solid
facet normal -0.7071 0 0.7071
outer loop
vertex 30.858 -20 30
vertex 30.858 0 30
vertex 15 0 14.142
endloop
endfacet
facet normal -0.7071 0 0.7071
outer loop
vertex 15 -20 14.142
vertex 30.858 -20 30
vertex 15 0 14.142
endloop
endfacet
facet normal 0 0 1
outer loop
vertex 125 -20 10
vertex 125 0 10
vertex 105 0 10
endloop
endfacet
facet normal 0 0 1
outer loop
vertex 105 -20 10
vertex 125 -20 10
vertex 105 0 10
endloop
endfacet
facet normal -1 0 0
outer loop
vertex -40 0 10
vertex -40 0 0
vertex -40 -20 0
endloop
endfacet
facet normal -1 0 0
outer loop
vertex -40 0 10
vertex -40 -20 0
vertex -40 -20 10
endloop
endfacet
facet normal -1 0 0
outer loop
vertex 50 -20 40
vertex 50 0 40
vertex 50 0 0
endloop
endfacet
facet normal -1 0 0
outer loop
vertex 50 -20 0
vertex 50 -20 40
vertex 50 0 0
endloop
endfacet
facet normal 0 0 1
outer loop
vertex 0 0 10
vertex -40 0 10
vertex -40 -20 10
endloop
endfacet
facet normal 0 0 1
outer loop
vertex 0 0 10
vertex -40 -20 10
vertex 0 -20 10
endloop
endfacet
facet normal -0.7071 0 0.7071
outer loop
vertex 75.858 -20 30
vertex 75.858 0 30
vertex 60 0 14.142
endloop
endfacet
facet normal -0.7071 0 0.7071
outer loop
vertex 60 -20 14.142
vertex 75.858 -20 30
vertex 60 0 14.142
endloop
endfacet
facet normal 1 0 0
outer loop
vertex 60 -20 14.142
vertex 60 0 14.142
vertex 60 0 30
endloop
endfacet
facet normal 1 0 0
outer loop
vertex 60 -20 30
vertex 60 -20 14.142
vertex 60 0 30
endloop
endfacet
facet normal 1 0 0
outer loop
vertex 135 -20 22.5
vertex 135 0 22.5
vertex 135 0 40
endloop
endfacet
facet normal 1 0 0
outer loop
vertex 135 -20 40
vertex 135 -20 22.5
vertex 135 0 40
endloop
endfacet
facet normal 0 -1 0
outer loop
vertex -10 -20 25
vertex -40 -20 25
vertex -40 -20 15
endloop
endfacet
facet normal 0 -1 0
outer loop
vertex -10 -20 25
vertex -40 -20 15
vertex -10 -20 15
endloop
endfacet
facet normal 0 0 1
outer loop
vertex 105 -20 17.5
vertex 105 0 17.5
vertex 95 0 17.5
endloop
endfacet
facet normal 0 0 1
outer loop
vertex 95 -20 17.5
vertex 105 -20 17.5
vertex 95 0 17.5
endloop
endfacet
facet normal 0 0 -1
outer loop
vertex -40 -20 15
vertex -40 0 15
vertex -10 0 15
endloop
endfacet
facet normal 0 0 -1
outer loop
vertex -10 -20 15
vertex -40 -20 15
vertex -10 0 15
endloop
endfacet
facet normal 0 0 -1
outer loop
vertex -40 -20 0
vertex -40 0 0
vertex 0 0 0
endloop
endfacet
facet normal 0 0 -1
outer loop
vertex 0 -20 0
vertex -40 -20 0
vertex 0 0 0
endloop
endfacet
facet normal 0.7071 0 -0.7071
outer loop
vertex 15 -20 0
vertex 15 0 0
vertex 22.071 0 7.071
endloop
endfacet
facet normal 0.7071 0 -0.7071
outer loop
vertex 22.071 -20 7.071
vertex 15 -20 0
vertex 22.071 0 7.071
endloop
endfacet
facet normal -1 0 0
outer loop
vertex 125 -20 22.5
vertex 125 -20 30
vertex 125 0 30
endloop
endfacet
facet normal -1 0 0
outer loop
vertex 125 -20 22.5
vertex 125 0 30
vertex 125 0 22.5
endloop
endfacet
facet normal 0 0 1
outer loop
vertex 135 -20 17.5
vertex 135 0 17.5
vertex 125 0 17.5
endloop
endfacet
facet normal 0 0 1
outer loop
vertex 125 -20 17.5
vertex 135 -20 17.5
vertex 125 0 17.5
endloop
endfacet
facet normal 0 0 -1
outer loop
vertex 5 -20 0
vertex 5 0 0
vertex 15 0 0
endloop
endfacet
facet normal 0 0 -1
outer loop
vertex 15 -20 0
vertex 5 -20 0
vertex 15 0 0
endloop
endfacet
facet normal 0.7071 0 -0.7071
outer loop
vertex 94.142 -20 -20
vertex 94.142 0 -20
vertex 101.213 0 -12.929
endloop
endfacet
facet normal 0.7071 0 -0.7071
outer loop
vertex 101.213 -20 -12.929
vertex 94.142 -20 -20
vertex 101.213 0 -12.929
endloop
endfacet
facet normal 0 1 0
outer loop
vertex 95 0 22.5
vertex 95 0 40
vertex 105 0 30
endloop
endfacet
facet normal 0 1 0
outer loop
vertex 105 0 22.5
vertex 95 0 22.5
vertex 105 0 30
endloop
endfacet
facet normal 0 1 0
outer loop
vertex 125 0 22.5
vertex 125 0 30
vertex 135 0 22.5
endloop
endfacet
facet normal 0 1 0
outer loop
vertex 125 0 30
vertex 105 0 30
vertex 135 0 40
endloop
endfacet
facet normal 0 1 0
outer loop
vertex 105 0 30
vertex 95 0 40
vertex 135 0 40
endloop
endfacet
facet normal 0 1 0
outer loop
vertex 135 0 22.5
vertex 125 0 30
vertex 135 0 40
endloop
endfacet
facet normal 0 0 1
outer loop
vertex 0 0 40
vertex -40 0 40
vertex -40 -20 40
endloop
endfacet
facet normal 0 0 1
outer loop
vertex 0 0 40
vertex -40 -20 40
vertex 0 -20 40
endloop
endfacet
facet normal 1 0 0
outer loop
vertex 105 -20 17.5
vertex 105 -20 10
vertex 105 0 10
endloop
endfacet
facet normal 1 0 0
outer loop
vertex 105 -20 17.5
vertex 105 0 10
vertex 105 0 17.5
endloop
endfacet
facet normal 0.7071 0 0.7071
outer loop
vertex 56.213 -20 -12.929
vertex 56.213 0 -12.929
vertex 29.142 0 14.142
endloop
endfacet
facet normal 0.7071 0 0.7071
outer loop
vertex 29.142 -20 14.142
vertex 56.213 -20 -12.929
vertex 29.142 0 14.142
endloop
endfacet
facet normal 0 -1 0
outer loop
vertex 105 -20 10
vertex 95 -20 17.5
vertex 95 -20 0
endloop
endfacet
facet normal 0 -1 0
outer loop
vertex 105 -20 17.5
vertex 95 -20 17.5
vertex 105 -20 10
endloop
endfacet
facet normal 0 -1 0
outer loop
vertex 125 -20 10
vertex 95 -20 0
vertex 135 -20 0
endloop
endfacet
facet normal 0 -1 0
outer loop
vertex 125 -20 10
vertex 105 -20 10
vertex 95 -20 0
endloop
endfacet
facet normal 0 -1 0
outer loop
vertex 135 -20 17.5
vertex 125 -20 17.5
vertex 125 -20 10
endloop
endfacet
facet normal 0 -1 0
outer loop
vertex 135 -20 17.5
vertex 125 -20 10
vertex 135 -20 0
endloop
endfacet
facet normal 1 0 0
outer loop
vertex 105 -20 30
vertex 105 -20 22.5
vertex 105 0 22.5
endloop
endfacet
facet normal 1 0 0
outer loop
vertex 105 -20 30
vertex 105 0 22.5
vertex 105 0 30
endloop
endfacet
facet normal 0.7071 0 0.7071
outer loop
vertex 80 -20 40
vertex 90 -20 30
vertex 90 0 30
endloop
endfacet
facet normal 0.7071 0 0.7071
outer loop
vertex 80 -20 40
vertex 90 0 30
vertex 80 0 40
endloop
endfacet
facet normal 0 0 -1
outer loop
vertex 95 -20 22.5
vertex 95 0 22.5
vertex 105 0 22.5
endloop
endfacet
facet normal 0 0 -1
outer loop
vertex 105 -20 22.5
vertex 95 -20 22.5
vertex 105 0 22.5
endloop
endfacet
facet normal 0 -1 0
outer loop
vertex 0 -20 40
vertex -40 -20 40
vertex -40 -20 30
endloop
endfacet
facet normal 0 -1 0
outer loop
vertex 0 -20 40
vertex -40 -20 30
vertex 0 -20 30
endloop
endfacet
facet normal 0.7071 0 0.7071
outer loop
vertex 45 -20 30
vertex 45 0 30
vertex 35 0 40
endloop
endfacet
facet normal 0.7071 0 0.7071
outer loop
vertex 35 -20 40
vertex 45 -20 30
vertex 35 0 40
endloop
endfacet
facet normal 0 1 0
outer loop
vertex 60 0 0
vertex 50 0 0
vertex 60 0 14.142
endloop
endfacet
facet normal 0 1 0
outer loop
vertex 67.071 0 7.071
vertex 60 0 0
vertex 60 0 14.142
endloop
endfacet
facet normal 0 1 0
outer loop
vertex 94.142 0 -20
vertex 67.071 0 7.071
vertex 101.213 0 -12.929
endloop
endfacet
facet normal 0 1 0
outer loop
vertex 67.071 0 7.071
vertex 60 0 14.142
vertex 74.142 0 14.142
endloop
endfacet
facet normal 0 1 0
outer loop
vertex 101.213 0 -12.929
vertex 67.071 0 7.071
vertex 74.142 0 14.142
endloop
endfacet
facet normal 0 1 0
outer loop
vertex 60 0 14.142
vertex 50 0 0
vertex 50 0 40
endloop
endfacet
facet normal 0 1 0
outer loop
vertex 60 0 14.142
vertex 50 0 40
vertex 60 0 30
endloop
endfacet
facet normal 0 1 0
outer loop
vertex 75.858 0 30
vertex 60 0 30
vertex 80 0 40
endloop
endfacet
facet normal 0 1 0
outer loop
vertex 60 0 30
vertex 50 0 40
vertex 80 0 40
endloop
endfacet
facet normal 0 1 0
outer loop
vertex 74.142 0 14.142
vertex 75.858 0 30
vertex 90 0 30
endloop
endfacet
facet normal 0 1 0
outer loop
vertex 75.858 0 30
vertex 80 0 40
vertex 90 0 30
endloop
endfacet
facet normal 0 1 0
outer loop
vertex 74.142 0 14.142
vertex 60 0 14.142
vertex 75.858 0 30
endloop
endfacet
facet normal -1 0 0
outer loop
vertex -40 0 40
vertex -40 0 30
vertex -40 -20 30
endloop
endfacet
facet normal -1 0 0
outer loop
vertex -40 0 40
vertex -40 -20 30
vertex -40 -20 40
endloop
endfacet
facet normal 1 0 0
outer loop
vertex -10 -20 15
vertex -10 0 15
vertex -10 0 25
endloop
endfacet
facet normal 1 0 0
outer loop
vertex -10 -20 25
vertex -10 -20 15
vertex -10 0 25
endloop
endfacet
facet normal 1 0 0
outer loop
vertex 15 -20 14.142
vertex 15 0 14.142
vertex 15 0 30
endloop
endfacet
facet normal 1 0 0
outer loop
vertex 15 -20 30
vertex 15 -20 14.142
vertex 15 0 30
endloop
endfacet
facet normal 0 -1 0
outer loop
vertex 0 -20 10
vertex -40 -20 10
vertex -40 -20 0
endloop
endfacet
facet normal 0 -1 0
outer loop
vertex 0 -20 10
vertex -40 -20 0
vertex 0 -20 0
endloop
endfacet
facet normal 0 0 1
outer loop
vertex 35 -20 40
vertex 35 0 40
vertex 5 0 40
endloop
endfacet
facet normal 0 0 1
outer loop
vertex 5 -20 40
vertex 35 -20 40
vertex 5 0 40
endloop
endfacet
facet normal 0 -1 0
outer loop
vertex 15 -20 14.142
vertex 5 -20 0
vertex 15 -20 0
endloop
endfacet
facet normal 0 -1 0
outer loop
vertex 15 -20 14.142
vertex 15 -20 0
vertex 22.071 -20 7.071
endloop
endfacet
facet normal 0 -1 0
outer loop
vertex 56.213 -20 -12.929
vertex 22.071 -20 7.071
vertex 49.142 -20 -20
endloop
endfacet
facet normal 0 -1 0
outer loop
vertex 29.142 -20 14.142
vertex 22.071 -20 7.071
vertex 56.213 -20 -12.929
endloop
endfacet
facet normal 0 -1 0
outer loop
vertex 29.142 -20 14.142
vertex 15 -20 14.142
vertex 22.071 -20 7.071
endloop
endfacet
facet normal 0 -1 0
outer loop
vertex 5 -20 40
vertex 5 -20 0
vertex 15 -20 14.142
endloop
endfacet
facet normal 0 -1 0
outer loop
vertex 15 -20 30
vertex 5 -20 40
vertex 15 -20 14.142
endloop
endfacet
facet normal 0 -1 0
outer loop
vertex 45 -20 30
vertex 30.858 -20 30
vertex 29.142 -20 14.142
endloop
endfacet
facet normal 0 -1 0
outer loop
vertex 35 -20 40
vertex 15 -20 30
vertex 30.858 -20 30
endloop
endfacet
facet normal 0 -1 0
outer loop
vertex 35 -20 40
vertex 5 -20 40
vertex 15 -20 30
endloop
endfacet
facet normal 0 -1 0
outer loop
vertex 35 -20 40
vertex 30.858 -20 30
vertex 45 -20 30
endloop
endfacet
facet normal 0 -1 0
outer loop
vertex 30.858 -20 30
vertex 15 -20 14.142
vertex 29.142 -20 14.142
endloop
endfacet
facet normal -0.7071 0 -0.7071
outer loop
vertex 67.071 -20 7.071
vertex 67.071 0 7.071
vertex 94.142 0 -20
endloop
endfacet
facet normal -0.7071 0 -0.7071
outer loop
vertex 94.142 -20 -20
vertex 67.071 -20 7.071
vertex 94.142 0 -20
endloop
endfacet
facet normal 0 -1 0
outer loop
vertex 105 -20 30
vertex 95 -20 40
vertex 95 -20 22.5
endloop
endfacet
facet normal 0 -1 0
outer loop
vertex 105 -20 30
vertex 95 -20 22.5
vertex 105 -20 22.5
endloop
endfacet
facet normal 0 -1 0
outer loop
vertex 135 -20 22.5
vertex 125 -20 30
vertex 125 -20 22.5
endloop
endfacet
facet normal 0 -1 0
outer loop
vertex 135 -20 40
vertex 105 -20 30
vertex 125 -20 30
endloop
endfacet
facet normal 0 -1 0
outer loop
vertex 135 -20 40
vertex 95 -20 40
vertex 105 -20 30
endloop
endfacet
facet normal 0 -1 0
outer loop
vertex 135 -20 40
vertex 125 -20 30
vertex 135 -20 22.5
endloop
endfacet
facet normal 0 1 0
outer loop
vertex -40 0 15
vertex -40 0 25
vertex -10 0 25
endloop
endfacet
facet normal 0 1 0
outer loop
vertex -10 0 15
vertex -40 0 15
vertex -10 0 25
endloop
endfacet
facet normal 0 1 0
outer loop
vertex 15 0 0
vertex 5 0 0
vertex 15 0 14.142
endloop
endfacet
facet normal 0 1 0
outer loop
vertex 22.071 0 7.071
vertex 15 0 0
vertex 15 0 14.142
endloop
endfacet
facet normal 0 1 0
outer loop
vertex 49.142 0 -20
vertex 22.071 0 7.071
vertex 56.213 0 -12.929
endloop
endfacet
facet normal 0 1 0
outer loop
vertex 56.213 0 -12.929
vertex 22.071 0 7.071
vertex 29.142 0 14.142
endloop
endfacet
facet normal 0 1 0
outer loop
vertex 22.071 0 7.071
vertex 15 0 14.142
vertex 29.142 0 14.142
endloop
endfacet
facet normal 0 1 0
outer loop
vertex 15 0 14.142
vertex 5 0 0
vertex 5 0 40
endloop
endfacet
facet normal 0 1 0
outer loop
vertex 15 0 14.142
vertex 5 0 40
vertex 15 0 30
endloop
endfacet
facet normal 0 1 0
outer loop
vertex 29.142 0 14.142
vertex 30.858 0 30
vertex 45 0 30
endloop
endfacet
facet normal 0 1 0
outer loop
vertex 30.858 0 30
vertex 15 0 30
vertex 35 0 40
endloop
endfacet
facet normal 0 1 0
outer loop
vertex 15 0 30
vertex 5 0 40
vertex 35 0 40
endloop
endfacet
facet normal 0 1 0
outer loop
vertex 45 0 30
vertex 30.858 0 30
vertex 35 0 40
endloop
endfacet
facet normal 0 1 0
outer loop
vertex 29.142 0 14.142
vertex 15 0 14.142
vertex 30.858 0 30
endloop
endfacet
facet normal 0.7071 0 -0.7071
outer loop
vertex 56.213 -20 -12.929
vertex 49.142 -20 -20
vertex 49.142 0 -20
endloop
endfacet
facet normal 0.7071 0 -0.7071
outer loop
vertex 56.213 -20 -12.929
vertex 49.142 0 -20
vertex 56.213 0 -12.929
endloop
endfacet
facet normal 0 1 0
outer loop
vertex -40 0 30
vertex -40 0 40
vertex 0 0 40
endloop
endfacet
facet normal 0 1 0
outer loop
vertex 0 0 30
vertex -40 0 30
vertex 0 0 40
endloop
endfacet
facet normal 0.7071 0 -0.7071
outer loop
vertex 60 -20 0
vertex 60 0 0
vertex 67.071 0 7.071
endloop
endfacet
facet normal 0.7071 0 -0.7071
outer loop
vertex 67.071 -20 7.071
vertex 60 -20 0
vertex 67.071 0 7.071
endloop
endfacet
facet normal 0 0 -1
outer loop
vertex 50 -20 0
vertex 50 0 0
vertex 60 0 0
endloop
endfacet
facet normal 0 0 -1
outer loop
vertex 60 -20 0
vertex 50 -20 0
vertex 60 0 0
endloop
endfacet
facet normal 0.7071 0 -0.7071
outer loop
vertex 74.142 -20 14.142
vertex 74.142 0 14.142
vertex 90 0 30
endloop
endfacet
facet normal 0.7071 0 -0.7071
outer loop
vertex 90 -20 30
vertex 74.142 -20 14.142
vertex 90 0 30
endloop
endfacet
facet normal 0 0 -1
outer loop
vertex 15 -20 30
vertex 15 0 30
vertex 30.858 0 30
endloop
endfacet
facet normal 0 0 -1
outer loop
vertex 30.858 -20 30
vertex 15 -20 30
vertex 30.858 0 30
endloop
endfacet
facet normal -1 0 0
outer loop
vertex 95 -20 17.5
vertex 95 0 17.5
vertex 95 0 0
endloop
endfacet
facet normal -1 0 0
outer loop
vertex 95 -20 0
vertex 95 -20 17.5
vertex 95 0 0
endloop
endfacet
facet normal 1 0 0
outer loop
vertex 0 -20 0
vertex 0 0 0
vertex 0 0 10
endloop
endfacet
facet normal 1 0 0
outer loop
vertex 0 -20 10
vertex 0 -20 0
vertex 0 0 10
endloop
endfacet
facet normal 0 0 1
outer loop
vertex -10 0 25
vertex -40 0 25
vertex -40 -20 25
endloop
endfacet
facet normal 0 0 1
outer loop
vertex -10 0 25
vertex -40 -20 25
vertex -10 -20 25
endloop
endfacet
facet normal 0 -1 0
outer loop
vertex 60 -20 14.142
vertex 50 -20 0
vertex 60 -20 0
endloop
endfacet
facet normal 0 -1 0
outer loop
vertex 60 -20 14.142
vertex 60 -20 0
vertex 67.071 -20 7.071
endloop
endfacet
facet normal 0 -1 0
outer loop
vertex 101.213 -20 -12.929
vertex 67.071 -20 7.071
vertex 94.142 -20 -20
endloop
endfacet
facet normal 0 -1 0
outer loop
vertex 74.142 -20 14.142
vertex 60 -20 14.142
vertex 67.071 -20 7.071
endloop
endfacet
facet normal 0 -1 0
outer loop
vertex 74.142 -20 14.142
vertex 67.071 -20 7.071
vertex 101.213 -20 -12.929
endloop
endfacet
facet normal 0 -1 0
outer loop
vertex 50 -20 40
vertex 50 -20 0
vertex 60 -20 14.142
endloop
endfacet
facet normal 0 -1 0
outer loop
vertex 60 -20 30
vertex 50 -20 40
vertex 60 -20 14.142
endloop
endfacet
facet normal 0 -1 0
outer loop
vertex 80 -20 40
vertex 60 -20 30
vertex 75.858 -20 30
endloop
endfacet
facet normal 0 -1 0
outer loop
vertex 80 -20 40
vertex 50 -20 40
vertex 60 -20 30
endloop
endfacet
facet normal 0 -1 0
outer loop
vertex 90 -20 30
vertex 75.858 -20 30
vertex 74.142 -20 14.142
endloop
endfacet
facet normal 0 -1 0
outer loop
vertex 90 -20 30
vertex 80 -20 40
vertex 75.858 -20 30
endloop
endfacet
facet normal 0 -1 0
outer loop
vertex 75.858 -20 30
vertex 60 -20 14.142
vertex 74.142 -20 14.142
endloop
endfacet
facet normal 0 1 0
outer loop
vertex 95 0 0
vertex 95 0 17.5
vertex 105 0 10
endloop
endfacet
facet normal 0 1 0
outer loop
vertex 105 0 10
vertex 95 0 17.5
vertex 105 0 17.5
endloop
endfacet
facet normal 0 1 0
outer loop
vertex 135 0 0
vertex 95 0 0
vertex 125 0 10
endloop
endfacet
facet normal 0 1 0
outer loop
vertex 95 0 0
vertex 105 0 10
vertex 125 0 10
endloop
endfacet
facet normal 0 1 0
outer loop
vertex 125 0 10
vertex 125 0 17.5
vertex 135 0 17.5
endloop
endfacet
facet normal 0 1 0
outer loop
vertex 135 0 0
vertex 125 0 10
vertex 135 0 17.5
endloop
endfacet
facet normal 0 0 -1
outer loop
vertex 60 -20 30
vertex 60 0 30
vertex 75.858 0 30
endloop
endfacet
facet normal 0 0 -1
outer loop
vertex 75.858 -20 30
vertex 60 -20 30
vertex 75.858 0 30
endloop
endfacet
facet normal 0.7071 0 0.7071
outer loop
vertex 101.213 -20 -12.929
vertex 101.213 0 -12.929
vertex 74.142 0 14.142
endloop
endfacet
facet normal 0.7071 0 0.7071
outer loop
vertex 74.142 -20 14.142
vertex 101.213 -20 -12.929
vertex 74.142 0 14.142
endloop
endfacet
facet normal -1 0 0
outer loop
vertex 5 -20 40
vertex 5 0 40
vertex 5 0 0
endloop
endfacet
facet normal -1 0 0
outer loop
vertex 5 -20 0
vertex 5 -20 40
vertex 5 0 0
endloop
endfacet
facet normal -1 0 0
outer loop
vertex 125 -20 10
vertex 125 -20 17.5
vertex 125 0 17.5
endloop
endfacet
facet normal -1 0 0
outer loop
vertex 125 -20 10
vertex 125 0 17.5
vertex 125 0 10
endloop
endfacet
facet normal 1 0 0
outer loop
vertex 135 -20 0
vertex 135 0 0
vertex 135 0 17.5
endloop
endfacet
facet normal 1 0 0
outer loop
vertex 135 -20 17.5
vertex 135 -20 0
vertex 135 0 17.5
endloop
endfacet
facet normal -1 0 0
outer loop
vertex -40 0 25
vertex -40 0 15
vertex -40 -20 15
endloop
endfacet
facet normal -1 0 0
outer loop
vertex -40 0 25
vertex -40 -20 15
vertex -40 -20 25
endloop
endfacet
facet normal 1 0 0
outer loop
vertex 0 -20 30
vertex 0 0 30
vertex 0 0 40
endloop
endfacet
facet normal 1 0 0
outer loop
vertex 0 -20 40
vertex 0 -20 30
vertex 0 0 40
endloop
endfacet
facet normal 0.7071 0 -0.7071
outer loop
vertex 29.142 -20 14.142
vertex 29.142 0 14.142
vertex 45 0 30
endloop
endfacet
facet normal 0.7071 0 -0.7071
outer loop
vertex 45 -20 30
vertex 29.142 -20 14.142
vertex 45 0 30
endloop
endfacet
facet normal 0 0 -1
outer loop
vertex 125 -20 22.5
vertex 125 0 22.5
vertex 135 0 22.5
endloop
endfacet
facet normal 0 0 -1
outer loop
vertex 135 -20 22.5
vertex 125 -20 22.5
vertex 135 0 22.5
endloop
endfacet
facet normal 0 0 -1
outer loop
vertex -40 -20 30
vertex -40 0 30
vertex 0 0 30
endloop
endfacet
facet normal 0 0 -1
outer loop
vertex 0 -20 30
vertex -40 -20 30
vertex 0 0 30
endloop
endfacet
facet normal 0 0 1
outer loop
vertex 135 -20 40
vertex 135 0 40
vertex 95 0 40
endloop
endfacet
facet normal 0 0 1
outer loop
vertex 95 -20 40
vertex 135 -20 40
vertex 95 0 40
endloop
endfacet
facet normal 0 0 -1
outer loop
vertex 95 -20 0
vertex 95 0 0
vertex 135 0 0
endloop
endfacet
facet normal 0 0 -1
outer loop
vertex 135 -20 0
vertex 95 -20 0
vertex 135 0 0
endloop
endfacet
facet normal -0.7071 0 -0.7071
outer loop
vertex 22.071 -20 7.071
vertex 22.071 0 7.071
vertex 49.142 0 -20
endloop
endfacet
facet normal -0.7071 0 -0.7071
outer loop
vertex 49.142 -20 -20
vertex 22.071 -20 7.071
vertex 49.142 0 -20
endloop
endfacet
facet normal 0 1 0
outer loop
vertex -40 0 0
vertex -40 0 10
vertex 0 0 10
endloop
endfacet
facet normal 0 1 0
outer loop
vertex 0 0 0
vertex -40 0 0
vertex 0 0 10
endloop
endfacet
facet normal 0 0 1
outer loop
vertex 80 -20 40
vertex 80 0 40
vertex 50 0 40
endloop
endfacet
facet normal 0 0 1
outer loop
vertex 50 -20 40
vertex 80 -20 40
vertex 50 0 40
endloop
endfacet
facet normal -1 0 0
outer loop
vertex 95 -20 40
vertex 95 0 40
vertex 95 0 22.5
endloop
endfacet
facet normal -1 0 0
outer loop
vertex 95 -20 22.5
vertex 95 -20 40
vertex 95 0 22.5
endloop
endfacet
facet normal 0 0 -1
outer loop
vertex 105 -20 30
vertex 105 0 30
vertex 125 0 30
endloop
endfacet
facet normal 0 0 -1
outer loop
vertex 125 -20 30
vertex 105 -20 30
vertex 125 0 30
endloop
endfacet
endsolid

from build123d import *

# Parameters (mm, degrees)
F0_W     = 40
F0_H     = 10
F0_W_2   = 30
F1_DEPTH = 20


with BuildPart() as f1:
    # F0 (on Front) → F1 (new body)
    with BuildSketch(Plane.XZ):
        with Locations((-20, 35)):
            Rectangle(F0_W, F0_H)
        with Locations((-25, 20)):
            Rectangle(F0_W_2, F0_H)
        with Locations((-20, 5)):
            Rectangle(F0_W, F0_H)
        Polygon((5, 40), (5, 0), (15, 0), (22.071068, 7.071068), (49.142136, -20), (56.213203, -12.928932), (29.142136, 14.142136), (45, 30), (35, 40), align=None)
        Polygon((15, 14.142136), (15, 30), (30.857864, 30), align=None, mode=Mode.SUBTRACT)
        Polygon((50, 40), (50, 0), (60, 0), (67.071068, 7.071068), (94.142136, -20), (101.213203, -12.928932), (74.142136, 14.142136), (90, 30), (80, 40), align=None)
        Polygon((60, 14.142136), (60, 30), (75.857864, 30), align=None, mode=Mode.SUBTRACT)
        Polygon((95, 17.5), (95, 0), (135, 0), (135, 17.5), (125, 17.5), (125, 10), (105, 10), (105, 17.5), align=None)
        Polygon((135, 40), (95, 40), (95, 22.5), (105, 22.5), (105, 30), (125, 30), (125, 22.5), (135, 22.5), align=None)
    extrude(amount=F1_DEPTH)


solid = f1.part
